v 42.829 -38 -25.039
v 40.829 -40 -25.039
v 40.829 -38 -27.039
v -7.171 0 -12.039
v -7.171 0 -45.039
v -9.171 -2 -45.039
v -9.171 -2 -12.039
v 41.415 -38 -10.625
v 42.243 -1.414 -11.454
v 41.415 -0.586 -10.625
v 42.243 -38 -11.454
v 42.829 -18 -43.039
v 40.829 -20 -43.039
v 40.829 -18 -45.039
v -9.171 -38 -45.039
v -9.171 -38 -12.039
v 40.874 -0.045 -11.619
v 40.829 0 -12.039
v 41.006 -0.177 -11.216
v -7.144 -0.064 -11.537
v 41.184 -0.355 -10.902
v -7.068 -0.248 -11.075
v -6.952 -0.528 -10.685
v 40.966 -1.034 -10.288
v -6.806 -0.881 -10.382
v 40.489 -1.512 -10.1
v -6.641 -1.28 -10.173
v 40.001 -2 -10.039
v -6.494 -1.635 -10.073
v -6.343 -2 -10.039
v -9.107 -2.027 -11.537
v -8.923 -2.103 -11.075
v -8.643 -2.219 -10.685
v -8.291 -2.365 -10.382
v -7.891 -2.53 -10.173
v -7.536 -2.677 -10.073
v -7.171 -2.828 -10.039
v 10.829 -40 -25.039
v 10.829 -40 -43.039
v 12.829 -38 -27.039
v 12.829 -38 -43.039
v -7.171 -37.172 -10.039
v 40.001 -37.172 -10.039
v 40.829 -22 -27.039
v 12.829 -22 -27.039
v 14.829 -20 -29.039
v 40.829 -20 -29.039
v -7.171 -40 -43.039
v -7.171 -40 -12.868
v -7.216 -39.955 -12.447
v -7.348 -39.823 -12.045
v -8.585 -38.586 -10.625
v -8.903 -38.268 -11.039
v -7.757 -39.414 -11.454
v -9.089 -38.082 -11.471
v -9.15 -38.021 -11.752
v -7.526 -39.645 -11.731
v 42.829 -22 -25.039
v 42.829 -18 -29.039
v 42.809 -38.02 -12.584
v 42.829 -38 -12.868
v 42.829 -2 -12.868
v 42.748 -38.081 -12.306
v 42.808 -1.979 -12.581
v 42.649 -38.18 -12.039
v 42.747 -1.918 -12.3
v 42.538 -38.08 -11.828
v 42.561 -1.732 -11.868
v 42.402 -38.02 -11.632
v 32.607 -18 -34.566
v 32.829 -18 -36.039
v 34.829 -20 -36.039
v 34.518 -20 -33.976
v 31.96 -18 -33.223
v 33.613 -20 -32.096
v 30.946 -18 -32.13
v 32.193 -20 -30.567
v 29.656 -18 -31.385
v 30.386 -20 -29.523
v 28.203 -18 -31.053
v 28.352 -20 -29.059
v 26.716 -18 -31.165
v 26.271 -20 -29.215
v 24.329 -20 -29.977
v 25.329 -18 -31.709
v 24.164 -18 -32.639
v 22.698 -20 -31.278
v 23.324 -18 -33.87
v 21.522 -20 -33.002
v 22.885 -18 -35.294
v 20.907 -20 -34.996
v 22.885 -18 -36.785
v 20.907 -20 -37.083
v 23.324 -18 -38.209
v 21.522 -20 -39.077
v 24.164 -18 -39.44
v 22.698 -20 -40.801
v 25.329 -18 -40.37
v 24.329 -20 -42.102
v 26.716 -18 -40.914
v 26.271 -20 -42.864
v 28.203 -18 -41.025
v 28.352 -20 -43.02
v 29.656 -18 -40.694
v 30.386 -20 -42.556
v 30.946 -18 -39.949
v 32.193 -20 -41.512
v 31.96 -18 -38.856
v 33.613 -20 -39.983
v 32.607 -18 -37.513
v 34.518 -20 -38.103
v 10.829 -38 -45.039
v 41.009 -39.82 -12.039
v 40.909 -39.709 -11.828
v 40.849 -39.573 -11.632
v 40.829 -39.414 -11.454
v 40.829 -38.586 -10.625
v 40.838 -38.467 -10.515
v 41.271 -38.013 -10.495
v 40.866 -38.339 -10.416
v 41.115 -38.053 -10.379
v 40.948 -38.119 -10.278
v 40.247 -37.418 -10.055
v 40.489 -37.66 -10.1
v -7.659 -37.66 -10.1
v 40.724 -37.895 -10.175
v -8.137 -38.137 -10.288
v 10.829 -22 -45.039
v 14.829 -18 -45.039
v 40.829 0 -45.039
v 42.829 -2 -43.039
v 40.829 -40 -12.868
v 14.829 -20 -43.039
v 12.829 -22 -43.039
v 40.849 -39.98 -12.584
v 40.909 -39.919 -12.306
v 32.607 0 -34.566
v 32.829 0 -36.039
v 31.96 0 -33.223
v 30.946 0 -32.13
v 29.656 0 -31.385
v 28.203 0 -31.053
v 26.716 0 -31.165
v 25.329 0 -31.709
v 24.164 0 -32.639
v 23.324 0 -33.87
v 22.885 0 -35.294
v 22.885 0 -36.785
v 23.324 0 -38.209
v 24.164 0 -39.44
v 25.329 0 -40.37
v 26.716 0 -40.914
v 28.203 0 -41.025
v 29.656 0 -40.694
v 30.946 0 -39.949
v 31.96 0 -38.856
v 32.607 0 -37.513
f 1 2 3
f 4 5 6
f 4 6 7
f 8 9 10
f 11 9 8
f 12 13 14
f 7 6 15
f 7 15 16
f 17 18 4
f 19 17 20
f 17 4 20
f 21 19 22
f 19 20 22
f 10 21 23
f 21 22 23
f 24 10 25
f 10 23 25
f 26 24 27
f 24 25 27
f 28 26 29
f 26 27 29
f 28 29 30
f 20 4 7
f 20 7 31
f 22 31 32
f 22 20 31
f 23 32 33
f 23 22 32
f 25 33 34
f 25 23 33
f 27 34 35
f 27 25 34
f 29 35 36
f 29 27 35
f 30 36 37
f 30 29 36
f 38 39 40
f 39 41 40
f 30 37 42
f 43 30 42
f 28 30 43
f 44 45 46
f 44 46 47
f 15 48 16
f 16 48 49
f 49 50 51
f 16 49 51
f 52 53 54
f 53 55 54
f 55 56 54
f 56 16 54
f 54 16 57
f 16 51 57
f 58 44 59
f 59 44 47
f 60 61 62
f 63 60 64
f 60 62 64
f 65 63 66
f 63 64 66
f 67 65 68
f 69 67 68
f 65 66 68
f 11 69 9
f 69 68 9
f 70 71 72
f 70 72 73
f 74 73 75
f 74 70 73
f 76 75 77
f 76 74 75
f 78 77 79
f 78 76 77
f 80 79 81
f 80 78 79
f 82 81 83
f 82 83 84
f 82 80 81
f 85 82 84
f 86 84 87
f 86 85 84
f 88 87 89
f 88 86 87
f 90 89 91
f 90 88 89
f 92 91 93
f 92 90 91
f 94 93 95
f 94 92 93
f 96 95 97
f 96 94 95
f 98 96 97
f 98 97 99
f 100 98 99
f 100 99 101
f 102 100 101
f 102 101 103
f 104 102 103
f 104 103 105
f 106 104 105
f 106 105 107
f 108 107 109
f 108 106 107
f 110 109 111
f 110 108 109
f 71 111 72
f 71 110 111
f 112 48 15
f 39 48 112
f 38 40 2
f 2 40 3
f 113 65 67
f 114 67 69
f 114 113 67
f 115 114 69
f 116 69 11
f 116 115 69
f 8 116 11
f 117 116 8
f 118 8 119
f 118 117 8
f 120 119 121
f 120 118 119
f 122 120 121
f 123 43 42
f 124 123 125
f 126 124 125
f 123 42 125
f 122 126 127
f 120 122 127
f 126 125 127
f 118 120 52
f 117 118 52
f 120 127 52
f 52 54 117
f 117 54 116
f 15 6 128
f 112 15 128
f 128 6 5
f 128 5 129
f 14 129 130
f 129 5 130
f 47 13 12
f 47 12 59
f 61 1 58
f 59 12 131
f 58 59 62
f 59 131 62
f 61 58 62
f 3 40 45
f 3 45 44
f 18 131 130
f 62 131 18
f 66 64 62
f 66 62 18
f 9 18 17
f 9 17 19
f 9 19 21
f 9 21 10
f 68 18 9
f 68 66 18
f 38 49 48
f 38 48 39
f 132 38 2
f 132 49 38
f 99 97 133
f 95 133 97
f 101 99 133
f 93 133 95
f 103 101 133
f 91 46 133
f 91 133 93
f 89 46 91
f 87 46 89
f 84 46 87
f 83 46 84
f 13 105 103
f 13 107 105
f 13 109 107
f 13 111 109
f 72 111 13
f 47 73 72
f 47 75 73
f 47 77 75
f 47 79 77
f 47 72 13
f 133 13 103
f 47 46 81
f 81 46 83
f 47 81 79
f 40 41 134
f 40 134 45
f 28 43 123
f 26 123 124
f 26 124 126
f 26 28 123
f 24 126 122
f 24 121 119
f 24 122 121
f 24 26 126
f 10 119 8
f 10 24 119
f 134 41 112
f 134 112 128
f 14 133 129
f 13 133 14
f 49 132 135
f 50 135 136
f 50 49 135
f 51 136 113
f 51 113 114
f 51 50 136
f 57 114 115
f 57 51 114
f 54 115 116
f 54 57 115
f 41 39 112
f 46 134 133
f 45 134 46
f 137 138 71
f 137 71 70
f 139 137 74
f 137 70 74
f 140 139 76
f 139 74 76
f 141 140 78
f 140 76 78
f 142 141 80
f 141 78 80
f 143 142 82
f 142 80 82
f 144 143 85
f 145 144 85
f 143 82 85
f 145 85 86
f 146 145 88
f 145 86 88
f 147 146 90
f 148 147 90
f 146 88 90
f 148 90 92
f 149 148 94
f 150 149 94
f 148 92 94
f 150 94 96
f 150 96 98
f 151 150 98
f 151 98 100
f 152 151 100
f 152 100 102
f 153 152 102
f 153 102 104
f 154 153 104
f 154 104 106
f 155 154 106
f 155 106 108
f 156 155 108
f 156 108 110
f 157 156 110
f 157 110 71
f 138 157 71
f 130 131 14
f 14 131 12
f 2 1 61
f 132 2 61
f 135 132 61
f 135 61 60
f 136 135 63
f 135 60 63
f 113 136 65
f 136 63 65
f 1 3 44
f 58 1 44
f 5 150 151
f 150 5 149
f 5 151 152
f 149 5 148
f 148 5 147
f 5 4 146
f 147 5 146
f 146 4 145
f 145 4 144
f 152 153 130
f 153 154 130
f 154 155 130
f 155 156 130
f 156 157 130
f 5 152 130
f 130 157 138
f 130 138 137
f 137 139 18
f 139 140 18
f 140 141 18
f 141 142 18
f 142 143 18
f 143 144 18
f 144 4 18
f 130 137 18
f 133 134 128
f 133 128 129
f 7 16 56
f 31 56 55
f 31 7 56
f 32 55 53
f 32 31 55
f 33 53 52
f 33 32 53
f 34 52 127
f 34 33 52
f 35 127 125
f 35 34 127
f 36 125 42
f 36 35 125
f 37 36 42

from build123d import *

# Parameters (mm, degrees)
F0_W         = 52
F0_H         = 35
F1_DEPTH     = 40
F2_W         = 30
F2_H         = 18
F3_DEPTH     = 20
F4_R         = 5
F5_DEPTH     = 20.001
F6_SIZE      = 1.99999
F7_T1_DEPTH  = 40.1421556237
F7_T3_DEPTH  = 42.1421456237
F7_T5_DEPTH  = 46.00002
F7_T7_DEPTH  = 12.8284129826
F7_T9_DEPTH  = 54.1421456237
F7_T11_DEPTH = 58.00002
F7_T13_DEPTH = 52.1421556237


# Not quite as in the source:
# - a fillet or chamfer that OpenCascade refuses, or shapes differently, is made with other operations: its cross-section is extruded or revolved along the edge and cut away or added
# - a fillet or chamfer is up to 0.001 mm smaller than in the source, because OpenCascade refuses the exact size


with BuildPart() as f1:
    # F0 (on Front) → F1 (new body)
    with BuildSketch(Plane.XZ):
        with Locations((16.8289473057, -27.5394749641)):
            Rectangle(F0_W, F0_H)
    extrude(amount=F1_DEPTH)

    # F2 (on face) → F3 (cut)
    with BuildSketch(Plane.XZ.offset(40)):
        with Locations((27.8289473057, -36.0394749641)):
            Rectangle(F2_W, F2_H)
    extrude(amount=-F3_DEPTH, mode=Mode.SUBTRACT)

    # F4 (on face) → F5 (cut, through all)
    with BuildSketch(Plane.XZ.offset(20)):
        with Locations((27.8289473057, -36.0394749641)):
            Circle(F4_R)
    extrude(amount=-F5_DEPTH, mode=Mode.SUBTRACT)

    # F6 (size 2 in the source; OpenCascade refuses exactly that, so slightly less here)
    f6_edges = [f1.edges().sort_by_distance(p)[0] for p in [
        (-9.171053, -40, -27.539475),
        (16.828947, -40, -10.039475),
        (42.828947, -40, -18.539475),
        (27.828947, -40, -27.039475),
        (12.828947, -40, -36.039475),
        (1.828947, -40, -45.039475),
        (-9.171053, 0, -27.539475),
        (27.828947, -20, -45.039475),
        (12.828947, -20, -36.039475),
        (42.828947, -20, -36.039475),
        (27.828947, -20, -27.039475),
        (22.828947, -20, -36.039475),
        (42.828947, 0, -27.539475),
        (42.828947, -20, -10.039475),
        (42.828947, -30, -27.039475),
        (42.828947, -10, -45.039475),
        (12.828947, -30, -45.039475),
    ]]
    chamfer(f6_edges, length=F6_SIZE)

    # F7: fillet of radius 2 on 7 edges, made by hand

    # F7_s2 → F7_t1 (cut)
    with BuildSketch(Plane.XZ.offset(-0.0710778119)):
        with BuildLine():
            ThreePointArc((42.8289473057, -12.8678920889), (42.6767063707, -12.1025252242), (42.2431608681, -11.4536785265))
            Line((42.2431608681, -11.4536785265), (42.8289473057, -12.0394649641))
            Line((42.8289473057, -12.0394649641), (42.8289473057, -12.8678920889))
        make_face()
    extrude(amount=F7_T1_DEPTH, mode=Mode.SUBTRACT)

    # F7_s4 → F7_t3 (cut)
    with BuildSketch(Plane.XZ.offset(-2.0710678119)):
        with BuildLine():
            ThreePointArc((40.0005301809, -10.0394749641), (40.7658970457, -10.1917158991), (41.4147437433, -10.6252614018))
            Line((41.4147437433, -10.6252614018), (40.8289573057, -10.0394749641))
            Line((40.8289573057, -10.0394749641), (40.0005301809, -10.0394749641))
        make_face()
    extrude(amount=F7_T3_DEPTH, mode=Mode.SUBTRACT)

    # F7_s6 → F7_t5 (cut)
    with BuildSketch(Plane.XZ.offset(-3.00001)):
        with BuildLine():
            ThreePointArc((-9.1710526943, -12.0394749641), (-8.5852662567, -10.6252614018), (-7.1710526943, -10.0394749641))
            Line((-7.1710526943, -10.0394749641), (-9.1710526943, -10.0394749641))
            Line((-9.1710526943, -10.0394749641), (-9.1710526943, -12.0394749641))
        make_face()
    extrude(amount=F7_T5_DEPTH, mode=Mode.SUBTRACT)

    # F7_s8 → F7_t7 (cut)
    with BuildSketch(Plane(origin=(-0.0499974412, -0.0499974412, 0), x_dir=(0, 0, 1), z_dir=(-0.7071067812, -0.7071067812, 0))):
        with BuildLine():
            ThreePointArc((-12.0394749641, 5.0707070595), (-10.6252614018, 4.4849206218), (-10.0394749641, 3.0707070595))
            Line((-10.0394749641, 3.0707070595), (-10.0394749641, 5.0707070595))
            Line((-10.0394749641, 5.0707070595), (-12.0394749641, 5.0707070595))
        make_face()
    extrude(amount=F7_T7_DEPTH, mode=Mode.SUBTRACT)

    # F7_s10 → F7_t9 (cut)
    with BuildSketch(Plane.YZ.offset(-11.2421205062)):
        with BuildLine():
            ThreePointArc((-37.1715828753, -10.0394749641), (-37.93694974, -10.1917158991), (-38.5857964376, -10.6252614018))
            Line((-38.5857964376, -10.6252614018), (-38.00001, -10.0394749641))
            Line((-38.00001, -10.0394749641), (-37.1715828753, -10.0394749641))
        make_face()
    extrude(amount=F7_T9_DEPTH, mode=Mode.SUBTRACT)

    # F7_s12 → F7_t11 (cut)
    with BuildSketch(Plane.YZ.offset(-12.1710626943)):
        with BuildLine():
            ThreePointArc((0, -12.0394749641), (-0.5857864376, -10.6252614018), (-2, -10.0394749641))
            Line((-2, -10.0394749641), (0, -10.0394749641))
            Line((0, -10.0394749641), (0, -12.0394749641))
        make_face()
    extrude(amount=F7_T11_DEPTH, mode=Mode.SUBTRACT)

    # F7_s14 → F7_t13 (cut)
    with BuildSketch(Plane.YZ.offset(-9.2421305062)):
        with BuildLine():
            ThreePointArc((-40, -12.8678920889), (-39.847759065, -12.1025252242), (-39.4142135624, -11.4536785265))
            Line((-39.4142135624, -11.4536785265), (-40, -12.0394649641))
            Line((-40, -12.0394649641), (-40, -12.8678920889))
        make_face()
    extrude(amount=F7_T13_DEPTH, mode=Mode.SUBTRACT)


solid = f1.part
